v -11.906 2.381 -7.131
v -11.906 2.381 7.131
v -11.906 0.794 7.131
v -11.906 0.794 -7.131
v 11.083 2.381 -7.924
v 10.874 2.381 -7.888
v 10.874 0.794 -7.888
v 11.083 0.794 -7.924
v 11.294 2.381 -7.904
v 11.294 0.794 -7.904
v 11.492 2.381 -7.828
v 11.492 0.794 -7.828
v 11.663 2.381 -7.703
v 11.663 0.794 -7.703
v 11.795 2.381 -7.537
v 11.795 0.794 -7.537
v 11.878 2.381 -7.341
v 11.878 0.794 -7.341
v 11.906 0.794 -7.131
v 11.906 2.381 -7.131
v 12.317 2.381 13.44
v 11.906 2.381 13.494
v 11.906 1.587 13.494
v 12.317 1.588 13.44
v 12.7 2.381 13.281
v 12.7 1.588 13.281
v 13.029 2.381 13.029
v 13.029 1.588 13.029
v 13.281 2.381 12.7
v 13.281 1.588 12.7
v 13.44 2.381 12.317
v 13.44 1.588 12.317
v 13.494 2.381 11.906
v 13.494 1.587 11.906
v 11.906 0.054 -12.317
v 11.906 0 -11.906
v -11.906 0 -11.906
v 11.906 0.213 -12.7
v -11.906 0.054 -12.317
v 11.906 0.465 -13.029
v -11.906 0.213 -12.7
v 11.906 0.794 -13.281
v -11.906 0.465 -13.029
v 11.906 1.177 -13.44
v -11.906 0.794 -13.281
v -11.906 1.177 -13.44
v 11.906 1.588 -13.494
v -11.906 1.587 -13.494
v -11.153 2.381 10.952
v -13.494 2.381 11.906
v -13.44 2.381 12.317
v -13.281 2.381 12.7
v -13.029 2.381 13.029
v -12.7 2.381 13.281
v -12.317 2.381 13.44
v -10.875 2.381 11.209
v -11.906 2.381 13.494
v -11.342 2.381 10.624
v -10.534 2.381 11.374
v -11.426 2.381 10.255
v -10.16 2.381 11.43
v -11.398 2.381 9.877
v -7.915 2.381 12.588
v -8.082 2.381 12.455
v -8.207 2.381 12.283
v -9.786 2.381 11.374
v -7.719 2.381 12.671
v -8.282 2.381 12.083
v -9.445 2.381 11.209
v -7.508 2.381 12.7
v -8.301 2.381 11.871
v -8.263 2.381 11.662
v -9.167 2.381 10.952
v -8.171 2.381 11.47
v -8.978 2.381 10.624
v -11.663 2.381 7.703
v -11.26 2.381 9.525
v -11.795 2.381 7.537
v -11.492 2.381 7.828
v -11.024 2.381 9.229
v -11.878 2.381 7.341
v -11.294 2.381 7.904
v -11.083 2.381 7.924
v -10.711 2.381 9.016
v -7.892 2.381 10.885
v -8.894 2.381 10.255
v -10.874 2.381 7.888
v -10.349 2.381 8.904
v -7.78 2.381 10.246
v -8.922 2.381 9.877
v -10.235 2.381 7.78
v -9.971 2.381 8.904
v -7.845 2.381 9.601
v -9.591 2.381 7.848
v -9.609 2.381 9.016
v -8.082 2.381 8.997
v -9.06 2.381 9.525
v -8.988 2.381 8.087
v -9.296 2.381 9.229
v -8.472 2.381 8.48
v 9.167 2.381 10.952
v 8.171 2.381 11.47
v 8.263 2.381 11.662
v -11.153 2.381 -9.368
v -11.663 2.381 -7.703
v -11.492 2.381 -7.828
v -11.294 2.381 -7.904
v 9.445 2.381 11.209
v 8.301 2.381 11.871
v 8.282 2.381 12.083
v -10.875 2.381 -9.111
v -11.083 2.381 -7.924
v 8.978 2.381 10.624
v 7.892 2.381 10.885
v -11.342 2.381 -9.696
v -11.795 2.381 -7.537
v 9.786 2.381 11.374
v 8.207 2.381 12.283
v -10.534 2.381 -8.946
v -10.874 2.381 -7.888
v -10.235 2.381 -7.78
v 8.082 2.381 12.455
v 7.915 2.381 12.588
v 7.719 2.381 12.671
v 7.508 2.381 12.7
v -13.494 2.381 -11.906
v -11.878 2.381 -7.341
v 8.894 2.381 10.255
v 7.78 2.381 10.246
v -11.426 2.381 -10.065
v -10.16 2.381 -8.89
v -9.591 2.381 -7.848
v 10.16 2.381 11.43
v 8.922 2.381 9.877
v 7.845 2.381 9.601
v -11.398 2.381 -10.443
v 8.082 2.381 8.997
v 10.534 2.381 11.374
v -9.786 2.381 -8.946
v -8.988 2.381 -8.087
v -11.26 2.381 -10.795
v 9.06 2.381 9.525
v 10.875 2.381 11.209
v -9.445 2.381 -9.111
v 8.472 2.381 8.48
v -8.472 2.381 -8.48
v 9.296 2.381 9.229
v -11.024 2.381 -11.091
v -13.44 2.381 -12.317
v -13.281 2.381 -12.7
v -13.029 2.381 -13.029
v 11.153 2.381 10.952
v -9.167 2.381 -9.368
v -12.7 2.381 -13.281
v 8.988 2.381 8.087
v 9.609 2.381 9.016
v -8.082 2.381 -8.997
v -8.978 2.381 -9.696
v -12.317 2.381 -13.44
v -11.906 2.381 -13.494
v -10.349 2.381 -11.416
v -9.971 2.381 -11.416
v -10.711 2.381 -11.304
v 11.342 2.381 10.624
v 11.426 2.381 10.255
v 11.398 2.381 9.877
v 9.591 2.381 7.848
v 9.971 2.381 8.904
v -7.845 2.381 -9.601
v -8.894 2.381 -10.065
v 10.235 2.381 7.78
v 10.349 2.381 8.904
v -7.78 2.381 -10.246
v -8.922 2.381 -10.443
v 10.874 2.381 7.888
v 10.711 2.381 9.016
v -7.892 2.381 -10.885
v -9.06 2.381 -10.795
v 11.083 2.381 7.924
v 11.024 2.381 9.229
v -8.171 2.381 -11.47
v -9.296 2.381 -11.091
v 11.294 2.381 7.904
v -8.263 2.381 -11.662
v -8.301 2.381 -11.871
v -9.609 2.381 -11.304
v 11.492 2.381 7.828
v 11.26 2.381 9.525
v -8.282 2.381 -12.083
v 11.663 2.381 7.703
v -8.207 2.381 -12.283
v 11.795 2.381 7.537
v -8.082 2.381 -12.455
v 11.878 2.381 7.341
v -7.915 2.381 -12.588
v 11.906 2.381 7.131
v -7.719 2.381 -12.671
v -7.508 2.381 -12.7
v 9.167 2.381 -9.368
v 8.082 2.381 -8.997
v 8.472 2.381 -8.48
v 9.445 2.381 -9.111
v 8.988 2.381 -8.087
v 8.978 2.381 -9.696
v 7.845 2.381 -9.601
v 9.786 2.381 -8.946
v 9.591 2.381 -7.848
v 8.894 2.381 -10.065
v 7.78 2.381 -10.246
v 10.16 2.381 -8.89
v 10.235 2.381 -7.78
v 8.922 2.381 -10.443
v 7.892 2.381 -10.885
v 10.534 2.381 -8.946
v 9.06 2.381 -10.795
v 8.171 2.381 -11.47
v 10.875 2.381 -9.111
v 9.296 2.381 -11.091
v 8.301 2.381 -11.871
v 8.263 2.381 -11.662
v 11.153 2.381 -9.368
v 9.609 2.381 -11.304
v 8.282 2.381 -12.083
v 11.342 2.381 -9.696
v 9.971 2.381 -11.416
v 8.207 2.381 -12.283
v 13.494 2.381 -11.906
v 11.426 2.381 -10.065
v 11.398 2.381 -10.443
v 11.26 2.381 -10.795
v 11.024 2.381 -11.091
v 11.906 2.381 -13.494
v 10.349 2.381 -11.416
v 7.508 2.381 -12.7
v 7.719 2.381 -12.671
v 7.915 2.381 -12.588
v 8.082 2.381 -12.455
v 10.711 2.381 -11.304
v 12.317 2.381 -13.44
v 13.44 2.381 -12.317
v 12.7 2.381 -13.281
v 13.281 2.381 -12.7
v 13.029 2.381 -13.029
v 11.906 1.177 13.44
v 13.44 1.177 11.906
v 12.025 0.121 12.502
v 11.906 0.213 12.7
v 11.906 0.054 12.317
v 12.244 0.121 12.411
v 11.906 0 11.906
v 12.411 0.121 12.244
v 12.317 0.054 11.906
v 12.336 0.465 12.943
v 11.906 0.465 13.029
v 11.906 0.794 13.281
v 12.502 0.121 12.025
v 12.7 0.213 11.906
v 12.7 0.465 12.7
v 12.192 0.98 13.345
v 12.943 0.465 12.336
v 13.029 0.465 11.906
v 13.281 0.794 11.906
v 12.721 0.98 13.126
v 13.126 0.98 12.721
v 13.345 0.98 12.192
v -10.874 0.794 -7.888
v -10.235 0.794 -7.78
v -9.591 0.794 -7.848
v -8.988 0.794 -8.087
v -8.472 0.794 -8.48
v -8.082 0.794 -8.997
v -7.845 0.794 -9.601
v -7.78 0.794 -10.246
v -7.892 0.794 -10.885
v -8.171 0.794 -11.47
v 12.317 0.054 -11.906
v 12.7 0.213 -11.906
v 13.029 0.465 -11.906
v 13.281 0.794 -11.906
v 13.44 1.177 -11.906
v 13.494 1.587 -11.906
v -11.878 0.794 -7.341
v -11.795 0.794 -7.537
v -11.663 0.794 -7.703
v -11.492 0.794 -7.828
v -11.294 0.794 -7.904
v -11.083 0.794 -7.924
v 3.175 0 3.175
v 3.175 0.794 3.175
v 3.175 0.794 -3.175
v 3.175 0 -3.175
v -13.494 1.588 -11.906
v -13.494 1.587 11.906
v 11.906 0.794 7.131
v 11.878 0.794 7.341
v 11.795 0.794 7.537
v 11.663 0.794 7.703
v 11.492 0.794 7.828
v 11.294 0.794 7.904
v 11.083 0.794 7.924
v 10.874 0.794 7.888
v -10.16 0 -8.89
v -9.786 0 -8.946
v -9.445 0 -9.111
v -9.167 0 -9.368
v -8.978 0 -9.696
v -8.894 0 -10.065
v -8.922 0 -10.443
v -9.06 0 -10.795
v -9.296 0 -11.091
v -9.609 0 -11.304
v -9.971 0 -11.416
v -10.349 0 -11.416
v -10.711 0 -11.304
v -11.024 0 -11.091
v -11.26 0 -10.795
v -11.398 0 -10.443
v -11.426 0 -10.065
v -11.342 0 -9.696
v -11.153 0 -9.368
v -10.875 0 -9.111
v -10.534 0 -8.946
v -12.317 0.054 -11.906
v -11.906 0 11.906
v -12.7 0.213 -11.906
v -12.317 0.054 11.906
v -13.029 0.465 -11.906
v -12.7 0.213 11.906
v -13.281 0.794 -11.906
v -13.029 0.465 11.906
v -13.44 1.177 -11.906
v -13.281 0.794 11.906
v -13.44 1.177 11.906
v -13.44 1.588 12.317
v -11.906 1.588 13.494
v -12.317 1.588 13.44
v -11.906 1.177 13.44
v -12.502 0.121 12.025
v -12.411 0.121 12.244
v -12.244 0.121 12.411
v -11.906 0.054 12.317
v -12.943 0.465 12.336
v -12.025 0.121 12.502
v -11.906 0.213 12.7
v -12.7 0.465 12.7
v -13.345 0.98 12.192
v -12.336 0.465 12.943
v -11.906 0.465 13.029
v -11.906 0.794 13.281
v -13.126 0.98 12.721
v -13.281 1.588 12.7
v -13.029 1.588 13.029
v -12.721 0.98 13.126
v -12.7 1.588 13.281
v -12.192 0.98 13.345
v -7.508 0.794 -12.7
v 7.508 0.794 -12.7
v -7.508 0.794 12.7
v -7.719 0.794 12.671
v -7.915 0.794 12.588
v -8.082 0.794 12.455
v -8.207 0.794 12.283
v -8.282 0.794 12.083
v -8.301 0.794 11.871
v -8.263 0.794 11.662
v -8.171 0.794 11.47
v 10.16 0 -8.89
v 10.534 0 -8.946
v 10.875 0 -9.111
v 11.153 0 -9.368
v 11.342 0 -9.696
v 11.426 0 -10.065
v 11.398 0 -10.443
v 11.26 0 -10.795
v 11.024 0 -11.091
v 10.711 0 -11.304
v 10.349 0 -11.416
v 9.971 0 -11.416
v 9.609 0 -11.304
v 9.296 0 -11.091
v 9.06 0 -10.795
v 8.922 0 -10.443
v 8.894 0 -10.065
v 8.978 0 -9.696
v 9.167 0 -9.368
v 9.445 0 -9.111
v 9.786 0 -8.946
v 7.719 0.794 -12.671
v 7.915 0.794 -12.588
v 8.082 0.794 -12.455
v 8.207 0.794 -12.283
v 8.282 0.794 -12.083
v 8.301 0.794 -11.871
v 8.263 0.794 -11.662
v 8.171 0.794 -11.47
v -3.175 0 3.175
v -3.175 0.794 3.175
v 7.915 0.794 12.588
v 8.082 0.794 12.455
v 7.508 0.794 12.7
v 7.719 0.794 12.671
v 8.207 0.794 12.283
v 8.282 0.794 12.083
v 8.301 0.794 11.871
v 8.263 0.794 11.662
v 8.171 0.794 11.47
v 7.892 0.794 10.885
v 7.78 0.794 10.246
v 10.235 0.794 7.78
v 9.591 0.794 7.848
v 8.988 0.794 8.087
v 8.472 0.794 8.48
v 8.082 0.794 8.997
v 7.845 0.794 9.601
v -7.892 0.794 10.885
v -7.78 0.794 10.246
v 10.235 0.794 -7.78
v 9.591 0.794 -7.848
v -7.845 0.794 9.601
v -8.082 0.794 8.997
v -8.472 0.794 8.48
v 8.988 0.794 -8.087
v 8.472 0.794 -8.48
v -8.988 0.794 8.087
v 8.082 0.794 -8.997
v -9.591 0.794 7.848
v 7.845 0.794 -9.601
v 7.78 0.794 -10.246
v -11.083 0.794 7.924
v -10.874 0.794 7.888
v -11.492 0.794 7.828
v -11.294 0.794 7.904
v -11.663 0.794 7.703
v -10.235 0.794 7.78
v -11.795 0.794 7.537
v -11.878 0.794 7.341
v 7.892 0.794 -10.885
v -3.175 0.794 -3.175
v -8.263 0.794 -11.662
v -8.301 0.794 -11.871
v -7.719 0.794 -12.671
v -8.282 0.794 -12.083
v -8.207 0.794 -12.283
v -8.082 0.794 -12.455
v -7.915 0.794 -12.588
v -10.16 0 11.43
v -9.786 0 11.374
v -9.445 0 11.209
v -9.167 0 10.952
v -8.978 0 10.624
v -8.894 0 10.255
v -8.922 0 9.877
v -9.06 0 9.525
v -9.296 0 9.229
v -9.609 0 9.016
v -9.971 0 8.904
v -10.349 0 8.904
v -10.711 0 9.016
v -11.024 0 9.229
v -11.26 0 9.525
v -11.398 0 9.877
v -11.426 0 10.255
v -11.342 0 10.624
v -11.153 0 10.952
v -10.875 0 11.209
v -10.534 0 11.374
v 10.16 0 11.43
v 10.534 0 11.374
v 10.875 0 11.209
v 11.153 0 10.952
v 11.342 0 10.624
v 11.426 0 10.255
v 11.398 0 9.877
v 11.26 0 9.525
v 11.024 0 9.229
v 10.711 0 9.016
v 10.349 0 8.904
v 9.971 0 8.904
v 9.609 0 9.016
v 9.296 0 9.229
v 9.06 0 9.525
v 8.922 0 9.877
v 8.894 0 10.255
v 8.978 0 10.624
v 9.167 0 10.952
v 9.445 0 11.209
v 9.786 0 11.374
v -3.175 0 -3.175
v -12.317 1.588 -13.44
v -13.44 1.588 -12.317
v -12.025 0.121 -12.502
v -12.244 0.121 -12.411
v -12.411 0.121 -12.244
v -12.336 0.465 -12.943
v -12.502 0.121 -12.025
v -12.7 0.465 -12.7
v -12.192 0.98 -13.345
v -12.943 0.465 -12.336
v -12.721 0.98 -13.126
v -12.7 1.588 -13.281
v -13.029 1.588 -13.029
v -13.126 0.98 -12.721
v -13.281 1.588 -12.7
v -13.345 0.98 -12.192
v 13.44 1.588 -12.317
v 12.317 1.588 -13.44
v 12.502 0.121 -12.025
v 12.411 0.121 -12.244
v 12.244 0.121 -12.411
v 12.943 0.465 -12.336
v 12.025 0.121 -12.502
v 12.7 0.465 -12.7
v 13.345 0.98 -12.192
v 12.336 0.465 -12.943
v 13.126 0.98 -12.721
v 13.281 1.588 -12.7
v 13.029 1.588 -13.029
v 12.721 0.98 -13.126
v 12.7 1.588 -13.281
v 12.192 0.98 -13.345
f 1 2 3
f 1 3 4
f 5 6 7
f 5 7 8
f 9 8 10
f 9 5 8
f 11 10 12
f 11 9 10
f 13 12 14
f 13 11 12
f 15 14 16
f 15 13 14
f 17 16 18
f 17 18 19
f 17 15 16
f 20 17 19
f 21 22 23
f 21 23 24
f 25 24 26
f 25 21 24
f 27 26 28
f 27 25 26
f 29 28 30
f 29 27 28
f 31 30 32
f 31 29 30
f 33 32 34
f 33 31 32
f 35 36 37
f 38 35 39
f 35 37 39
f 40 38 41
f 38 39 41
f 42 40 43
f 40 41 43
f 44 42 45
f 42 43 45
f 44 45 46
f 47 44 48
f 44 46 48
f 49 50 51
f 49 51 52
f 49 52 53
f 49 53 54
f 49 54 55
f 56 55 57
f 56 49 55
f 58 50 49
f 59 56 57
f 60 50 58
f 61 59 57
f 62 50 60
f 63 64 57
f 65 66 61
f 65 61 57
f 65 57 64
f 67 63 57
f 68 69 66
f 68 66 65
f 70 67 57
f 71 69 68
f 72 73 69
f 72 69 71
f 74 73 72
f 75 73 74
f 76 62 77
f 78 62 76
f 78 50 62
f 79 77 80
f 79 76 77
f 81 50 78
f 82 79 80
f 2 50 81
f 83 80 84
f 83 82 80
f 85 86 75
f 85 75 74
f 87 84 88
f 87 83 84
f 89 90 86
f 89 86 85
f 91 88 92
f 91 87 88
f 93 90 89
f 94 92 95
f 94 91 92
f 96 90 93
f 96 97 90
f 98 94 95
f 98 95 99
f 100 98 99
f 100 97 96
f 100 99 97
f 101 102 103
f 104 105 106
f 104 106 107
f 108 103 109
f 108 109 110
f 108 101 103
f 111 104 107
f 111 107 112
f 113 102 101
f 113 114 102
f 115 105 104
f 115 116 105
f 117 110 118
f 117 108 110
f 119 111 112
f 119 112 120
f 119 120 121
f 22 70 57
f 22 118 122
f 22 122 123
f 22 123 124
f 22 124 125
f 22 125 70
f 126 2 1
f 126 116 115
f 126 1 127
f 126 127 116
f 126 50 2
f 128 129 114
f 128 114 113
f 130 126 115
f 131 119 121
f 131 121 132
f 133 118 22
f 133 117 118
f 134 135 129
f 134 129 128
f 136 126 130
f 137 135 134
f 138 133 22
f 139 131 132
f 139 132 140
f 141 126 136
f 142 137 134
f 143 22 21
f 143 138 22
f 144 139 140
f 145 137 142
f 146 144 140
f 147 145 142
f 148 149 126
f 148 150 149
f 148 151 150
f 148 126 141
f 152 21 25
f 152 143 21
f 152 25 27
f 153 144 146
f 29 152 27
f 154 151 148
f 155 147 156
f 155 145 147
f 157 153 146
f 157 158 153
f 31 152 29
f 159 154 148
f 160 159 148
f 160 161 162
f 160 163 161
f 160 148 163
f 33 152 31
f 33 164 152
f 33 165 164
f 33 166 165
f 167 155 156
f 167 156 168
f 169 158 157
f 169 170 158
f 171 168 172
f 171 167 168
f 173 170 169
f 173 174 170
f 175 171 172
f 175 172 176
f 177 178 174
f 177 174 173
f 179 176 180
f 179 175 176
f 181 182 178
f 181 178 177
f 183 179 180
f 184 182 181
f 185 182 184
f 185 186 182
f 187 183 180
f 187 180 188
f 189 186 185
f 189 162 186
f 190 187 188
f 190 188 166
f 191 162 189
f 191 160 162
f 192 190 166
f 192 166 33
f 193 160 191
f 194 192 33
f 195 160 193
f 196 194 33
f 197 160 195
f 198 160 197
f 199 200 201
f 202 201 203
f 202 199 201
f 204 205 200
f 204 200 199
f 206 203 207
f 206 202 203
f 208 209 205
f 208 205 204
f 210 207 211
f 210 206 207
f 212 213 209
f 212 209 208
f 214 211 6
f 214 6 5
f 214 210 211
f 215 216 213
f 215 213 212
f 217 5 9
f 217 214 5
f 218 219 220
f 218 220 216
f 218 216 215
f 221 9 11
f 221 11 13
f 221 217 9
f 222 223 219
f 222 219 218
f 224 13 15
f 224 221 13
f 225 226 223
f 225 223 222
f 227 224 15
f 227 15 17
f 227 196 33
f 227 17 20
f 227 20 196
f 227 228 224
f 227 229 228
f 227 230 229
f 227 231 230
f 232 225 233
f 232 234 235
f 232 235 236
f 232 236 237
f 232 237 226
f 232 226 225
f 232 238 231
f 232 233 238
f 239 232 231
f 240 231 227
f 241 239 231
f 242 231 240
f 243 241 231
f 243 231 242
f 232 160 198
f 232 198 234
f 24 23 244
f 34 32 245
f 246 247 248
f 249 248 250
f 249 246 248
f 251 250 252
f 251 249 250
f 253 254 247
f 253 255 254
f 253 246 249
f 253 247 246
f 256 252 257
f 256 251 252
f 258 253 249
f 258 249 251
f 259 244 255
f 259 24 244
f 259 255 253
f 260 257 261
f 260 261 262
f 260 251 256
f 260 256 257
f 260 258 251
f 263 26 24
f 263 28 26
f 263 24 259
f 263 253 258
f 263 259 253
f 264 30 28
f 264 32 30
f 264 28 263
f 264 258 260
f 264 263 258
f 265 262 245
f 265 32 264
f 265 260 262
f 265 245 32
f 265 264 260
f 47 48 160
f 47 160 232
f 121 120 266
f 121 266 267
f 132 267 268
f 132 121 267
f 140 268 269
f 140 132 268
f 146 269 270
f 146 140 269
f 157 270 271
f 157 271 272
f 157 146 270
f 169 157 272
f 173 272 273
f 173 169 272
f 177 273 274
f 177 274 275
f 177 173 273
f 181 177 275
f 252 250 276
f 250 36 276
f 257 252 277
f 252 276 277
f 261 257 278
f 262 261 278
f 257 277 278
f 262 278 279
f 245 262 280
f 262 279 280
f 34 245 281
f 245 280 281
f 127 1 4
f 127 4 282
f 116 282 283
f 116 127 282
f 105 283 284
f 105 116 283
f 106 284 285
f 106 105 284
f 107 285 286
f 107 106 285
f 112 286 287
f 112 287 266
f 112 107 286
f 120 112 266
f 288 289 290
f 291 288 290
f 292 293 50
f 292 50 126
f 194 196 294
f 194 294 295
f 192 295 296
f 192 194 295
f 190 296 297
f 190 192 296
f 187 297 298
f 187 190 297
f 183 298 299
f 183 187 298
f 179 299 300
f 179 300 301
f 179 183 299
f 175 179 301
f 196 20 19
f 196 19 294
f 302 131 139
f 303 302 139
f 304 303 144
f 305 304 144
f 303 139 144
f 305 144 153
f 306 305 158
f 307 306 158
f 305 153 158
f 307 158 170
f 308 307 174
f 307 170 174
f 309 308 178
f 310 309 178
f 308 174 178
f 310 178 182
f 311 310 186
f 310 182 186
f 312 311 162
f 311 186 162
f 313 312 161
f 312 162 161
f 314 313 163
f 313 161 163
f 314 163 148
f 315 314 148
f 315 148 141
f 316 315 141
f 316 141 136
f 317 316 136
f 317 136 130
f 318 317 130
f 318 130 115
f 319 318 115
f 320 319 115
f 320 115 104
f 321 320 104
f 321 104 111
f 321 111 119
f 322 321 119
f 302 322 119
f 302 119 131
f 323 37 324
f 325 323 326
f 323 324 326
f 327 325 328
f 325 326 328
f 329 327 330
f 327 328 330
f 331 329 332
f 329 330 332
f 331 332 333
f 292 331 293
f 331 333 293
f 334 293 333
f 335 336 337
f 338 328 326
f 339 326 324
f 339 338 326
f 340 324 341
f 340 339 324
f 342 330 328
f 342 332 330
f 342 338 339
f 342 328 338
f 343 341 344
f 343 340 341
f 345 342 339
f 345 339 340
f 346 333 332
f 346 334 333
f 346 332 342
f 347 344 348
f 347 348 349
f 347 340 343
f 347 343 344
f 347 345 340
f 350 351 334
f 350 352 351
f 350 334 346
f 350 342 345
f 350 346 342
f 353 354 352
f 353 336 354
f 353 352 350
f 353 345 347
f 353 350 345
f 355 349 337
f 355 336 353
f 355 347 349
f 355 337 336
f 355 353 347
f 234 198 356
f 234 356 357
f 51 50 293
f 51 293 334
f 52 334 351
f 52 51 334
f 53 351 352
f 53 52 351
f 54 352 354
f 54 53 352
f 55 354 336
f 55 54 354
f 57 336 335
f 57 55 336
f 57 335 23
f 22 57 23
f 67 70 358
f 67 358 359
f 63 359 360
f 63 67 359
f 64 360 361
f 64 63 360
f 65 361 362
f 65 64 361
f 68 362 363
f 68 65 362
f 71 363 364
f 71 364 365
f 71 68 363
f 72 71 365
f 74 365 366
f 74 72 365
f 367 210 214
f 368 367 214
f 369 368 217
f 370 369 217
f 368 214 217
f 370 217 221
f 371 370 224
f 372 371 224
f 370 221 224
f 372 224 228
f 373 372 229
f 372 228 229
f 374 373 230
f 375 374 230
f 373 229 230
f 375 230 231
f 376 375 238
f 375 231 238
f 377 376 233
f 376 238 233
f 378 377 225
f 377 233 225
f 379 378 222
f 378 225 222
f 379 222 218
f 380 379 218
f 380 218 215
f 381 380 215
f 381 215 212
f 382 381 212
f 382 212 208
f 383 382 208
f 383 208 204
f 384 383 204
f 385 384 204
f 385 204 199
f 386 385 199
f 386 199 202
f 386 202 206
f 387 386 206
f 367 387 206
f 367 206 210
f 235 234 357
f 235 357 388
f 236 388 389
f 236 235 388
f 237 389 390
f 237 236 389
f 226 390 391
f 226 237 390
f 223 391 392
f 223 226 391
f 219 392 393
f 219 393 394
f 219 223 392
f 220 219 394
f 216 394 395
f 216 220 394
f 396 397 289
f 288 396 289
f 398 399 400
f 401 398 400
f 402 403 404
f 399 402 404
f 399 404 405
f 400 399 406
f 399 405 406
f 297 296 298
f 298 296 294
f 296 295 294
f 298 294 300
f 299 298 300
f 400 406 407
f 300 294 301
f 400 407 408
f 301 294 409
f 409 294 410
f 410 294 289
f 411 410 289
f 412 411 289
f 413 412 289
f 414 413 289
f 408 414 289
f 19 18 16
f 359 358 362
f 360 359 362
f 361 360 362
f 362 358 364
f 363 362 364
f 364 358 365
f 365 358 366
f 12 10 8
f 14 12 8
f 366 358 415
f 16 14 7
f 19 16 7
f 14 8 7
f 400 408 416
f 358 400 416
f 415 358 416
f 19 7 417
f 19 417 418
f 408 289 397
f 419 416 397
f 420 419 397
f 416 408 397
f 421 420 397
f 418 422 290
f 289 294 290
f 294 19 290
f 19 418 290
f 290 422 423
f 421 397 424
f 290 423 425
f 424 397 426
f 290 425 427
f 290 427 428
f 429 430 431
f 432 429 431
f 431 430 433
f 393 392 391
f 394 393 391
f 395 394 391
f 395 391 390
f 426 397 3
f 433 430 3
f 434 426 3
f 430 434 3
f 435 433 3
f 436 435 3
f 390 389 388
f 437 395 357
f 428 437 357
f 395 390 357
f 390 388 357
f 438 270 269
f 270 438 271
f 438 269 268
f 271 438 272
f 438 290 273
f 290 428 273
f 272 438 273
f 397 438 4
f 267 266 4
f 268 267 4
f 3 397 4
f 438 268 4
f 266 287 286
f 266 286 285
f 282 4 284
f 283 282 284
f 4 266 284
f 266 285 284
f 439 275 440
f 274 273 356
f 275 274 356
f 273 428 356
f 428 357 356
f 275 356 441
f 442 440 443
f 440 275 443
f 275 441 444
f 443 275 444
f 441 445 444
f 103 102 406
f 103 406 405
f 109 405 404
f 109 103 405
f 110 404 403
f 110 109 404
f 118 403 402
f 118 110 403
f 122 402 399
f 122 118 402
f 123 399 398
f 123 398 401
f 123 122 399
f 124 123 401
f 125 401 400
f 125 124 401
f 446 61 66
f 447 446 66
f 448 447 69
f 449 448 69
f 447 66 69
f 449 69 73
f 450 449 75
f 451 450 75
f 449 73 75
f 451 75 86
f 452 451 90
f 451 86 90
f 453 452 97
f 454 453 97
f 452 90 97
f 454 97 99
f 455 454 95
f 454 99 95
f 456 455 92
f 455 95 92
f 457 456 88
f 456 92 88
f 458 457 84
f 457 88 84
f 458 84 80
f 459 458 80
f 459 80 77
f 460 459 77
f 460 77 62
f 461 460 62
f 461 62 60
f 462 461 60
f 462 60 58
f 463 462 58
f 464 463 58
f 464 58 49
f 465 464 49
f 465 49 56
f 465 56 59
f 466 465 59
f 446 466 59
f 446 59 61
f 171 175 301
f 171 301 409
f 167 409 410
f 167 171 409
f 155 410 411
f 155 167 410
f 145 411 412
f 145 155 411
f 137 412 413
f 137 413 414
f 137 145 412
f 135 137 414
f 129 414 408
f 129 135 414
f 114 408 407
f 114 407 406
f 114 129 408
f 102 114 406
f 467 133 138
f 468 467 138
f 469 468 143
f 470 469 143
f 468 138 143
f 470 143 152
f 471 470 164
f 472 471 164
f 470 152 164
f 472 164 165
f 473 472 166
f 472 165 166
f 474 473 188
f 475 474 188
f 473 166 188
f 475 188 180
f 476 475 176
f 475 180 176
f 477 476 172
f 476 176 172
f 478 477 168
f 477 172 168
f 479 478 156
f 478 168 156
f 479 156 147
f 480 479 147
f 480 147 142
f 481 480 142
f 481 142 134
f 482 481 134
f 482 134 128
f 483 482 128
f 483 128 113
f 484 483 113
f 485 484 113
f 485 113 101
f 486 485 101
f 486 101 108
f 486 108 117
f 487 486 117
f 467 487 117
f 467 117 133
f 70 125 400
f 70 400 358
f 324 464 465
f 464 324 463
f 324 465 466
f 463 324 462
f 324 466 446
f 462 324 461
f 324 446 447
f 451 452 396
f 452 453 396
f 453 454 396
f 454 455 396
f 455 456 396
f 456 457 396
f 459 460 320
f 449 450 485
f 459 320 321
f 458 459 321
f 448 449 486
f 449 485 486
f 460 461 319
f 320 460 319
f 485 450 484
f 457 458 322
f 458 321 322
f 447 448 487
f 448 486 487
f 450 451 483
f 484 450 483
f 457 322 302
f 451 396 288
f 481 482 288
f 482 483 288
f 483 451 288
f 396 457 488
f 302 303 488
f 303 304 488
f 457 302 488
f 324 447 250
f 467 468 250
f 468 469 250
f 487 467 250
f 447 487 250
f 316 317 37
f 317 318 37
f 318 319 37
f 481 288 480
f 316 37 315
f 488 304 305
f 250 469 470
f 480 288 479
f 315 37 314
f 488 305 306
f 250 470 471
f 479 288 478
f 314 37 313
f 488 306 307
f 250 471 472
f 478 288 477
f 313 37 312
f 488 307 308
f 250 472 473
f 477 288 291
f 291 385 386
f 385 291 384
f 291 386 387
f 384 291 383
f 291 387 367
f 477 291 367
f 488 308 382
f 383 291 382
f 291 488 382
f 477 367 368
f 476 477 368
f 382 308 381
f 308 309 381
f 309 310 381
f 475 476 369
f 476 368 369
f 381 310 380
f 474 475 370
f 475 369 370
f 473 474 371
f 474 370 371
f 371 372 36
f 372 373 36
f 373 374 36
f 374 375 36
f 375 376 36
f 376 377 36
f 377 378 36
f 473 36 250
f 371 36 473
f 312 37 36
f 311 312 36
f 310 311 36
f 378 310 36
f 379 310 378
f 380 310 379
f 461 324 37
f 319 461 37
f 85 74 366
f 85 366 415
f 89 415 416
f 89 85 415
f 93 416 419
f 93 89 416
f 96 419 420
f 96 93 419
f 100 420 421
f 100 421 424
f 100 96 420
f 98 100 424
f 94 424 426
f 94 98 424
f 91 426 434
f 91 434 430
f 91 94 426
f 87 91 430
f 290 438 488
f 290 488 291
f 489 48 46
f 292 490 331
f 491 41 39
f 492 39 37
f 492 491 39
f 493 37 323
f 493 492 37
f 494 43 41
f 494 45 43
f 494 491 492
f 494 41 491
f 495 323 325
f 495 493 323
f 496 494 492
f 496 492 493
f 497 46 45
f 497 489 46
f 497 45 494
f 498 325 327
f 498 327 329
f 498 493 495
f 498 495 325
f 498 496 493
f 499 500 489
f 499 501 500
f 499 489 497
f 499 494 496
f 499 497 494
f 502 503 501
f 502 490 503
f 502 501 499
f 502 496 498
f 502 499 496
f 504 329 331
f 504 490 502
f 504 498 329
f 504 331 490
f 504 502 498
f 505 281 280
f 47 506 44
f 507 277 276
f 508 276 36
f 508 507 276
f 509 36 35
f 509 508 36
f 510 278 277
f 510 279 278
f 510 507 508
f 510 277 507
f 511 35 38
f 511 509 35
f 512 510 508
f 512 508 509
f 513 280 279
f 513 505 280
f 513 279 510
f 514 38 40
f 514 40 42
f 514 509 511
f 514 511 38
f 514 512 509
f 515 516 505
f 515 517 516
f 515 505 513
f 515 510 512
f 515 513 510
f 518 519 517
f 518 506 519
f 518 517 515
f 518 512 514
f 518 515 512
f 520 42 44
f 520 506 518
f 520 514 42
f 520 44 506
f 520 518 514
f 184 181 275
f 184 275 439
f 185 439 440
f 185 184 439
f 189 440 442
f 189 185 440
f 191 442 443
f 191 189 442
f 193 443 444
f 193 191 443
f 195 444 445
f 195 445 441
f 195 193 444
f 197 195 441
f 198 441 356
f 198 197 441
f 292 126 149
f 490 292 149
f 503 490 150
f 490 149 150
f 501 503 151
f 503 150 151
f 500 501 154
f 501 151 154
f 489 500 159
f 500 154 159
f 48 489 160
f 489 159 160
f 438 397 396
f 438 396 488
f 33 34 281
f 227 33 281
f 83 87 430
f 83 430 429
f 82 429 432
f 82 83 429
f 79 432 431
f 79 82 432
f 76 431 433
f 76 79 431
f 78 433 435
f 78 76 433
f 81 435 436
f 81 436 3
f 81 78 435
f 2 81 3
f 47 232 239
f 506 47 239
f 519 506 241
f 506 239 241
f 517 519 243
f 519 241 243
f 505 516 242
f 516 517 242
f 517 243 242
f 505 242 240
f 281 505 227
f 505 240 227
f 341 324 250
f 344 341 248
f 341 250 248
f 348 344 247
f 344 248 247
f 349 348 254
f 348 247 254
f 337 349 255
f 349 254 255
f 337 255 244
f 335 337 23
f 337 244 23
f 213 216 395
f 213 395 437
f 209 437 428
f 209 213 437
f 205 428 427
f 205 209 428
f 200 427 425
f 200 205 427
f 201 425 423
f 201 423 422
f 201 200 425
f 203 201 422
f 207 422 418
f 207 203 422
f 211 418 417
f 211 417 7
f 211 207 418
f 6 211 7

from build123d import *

# Parameters (mm, degrees)
SKETCH1_W           = 26.9875
SKETCH1_H           = 26.9875
BOSS_EXTRUDE1_DEPTH = 2.38125
SKETCH2_W           = 6.35
SKETCH2_H           = 6.35
CUT_EXTRUDE1_DEPTH  = 20.231040785
SKETCH3_R           = 1.27
CUT_EXTRUDE2_DEPTH  = 20.231040785
CUT_EXTRUDE3_DEPTH  = 1.5875
FILLET1_R           = 1.5875
FILLET2_R           = 1.5875


with BuildPart() as part:
    # Sketch1 → Boss-Extrude1 (new body)
    with BuildSketch(Plane(origin=(0, 0, 0), x_dir=(1, 0, 0), z_dir=(0, 1, 0))):
        Rectangle(SKETCH1_W, SKETCH1_H)
    extrude(amount=BOSS_EXTRUDE1_DEPTH)

    # Sketch2 → Cut-Extrude1 (cut, through all)
    with BuildSketch(Plane(origin=(0, 2.38125, 0), x_dir=(1, 0, 0), z_dir=(0, 1, 0))):
        Rectangle(SKETCH2_W, SKETCH2_H)
    extrude(amount=-CUT_EXTRUDE1_DEPTH, mode=Mode.SUBTRACT)

    # Sketch3 → Cut-Extrude2 (cut, through all)
    with BuildSketch(Plane(origin=(0, 2.38125, 0), x_dir=(1, 0, 0), z_dir=(0, 1, 0))):
        with Locations(Location((-10.16, 10.16, 0), (0, 0, 270))):
            Circle(SKETCH3_R)
        with Locations(Location((10.16, 10.16, 0), (0, 0, 270))):
            Circle(SKETCH3_R)
        with Locations(Location((10.16, -10.16, 0), (0, 0, 270))):
            Circle(SKETCH3_R)
        with Locations(Location((-10.16, -10.16, 0), (0, 0, 270))):
            Circle(SKETCH3_R)
    extrude(amount=-CUT_EXTRUDE2_DEPTH, mode=Mode.SUBTRACT)

    # Sketch4 → Cut-Extrude3 (cut)
    with BuildSketch(Plane(origin=(0, 2.38125, 0), x_dir=(1, 0, 0), z_dir=(0, 1, 0))):
        with BuildLine():
            Line((-11.90625, -7.131243036), (-11.90625, 7.131243036))
            ThreePointArc((-11.90625, 7.131243036), (-11.582088833, 7.771184744), (-10.874375, 7.888432277))
            ThreePointArc((-10.874375, 7.888432277), (-8.259382698, 8.725424998), (-8.171264167, 11.4696875))
            ThreePointArc((-8.171264167, 11.4696875), (-8.207122766, 12.282758684), (-7.508352222, 12.7))
            Line((-7.508352222, 12.7), (7.508352222, 12.7))
            ThreePointArc((7.508352222, 12.7), (8.207122766, 12.282758684), (8.171264167, 11.4696875))
            ThreePointArc((8.171264167, 11.4696875), (8.259382698, 8.725424998), (10.874375, 7.888432277))
            ThreePointArc((10.874375, 7.888432277), (11.582088833, 7.771184744), (11.90625, 7.131243036))
            Line((11.90625, 7.131243036), (11.90625, -7.131243036))
            ThreePointArc((11.90625, -7.131243036), (11.582088833, -7.771184744), (10.874375, -7.888432277))
            ThreePointArc((10.874375, -7.888432277), (8.259382698, -8.725424998), (8.171264167, -11.4696875))
            ThreePointArc((8.171264167, -11.4696875), (8.207122766, -12.282758684), (7.508352222, -12.7))
            Line((7.508352222, -12.7), (-7.508352222, -12.7))
            ThreePointArc((-7.508352222, -12.7), (-8.207122766, -12.282758684), (-8.171264167, -11.4696875))
            ThreePointArc((-8.171264167, -11.4696875), (-8.259382698, -8.725424998), (-10.874375, -7.888432277))
            ThreePointArc((-10.874375, -7.888432277), (-11.582088833, -7.771184744), (-11.90625, -7.131243036))
        make_face()
    extrude(amount=-CUT_EXTRUDE3_DEPTH, mode=Mode.SUBTRACT)

    # Fillet1
    fillet1_edges = [part.edges().sort_by_distance(p)[0] for p in [
        (13.49375, 1.190625, 13.49375),
        (-13.49375, 1.190625, 13.49375),
        (-13.49375, 1.190625, -13.49375),
        (13.49375, 1.190625, -13.49375),
    ]]
    fillet(fillet1_edges, radius=FILLET1_R)

    # Fillet2
    fillet2_edges = [part.edges().sort_by_distance(p)[0] for p in [
        (13.49375, 0, 0),
        (0, 0, 13.49375),
        (-13.49375, 0, 0),
        (0, 0, -13.49375),
        (-13.028782015, 0, 13.028782015),
        (-13.028782015, 0, -13.028782015),
        (13.028782015, 0, -13.028782015),
        (13.028782015, 0, 13.028782015),
    ]]
    fillet(fillet2_edges, radius=FILLET2_R)


solid = part.part
